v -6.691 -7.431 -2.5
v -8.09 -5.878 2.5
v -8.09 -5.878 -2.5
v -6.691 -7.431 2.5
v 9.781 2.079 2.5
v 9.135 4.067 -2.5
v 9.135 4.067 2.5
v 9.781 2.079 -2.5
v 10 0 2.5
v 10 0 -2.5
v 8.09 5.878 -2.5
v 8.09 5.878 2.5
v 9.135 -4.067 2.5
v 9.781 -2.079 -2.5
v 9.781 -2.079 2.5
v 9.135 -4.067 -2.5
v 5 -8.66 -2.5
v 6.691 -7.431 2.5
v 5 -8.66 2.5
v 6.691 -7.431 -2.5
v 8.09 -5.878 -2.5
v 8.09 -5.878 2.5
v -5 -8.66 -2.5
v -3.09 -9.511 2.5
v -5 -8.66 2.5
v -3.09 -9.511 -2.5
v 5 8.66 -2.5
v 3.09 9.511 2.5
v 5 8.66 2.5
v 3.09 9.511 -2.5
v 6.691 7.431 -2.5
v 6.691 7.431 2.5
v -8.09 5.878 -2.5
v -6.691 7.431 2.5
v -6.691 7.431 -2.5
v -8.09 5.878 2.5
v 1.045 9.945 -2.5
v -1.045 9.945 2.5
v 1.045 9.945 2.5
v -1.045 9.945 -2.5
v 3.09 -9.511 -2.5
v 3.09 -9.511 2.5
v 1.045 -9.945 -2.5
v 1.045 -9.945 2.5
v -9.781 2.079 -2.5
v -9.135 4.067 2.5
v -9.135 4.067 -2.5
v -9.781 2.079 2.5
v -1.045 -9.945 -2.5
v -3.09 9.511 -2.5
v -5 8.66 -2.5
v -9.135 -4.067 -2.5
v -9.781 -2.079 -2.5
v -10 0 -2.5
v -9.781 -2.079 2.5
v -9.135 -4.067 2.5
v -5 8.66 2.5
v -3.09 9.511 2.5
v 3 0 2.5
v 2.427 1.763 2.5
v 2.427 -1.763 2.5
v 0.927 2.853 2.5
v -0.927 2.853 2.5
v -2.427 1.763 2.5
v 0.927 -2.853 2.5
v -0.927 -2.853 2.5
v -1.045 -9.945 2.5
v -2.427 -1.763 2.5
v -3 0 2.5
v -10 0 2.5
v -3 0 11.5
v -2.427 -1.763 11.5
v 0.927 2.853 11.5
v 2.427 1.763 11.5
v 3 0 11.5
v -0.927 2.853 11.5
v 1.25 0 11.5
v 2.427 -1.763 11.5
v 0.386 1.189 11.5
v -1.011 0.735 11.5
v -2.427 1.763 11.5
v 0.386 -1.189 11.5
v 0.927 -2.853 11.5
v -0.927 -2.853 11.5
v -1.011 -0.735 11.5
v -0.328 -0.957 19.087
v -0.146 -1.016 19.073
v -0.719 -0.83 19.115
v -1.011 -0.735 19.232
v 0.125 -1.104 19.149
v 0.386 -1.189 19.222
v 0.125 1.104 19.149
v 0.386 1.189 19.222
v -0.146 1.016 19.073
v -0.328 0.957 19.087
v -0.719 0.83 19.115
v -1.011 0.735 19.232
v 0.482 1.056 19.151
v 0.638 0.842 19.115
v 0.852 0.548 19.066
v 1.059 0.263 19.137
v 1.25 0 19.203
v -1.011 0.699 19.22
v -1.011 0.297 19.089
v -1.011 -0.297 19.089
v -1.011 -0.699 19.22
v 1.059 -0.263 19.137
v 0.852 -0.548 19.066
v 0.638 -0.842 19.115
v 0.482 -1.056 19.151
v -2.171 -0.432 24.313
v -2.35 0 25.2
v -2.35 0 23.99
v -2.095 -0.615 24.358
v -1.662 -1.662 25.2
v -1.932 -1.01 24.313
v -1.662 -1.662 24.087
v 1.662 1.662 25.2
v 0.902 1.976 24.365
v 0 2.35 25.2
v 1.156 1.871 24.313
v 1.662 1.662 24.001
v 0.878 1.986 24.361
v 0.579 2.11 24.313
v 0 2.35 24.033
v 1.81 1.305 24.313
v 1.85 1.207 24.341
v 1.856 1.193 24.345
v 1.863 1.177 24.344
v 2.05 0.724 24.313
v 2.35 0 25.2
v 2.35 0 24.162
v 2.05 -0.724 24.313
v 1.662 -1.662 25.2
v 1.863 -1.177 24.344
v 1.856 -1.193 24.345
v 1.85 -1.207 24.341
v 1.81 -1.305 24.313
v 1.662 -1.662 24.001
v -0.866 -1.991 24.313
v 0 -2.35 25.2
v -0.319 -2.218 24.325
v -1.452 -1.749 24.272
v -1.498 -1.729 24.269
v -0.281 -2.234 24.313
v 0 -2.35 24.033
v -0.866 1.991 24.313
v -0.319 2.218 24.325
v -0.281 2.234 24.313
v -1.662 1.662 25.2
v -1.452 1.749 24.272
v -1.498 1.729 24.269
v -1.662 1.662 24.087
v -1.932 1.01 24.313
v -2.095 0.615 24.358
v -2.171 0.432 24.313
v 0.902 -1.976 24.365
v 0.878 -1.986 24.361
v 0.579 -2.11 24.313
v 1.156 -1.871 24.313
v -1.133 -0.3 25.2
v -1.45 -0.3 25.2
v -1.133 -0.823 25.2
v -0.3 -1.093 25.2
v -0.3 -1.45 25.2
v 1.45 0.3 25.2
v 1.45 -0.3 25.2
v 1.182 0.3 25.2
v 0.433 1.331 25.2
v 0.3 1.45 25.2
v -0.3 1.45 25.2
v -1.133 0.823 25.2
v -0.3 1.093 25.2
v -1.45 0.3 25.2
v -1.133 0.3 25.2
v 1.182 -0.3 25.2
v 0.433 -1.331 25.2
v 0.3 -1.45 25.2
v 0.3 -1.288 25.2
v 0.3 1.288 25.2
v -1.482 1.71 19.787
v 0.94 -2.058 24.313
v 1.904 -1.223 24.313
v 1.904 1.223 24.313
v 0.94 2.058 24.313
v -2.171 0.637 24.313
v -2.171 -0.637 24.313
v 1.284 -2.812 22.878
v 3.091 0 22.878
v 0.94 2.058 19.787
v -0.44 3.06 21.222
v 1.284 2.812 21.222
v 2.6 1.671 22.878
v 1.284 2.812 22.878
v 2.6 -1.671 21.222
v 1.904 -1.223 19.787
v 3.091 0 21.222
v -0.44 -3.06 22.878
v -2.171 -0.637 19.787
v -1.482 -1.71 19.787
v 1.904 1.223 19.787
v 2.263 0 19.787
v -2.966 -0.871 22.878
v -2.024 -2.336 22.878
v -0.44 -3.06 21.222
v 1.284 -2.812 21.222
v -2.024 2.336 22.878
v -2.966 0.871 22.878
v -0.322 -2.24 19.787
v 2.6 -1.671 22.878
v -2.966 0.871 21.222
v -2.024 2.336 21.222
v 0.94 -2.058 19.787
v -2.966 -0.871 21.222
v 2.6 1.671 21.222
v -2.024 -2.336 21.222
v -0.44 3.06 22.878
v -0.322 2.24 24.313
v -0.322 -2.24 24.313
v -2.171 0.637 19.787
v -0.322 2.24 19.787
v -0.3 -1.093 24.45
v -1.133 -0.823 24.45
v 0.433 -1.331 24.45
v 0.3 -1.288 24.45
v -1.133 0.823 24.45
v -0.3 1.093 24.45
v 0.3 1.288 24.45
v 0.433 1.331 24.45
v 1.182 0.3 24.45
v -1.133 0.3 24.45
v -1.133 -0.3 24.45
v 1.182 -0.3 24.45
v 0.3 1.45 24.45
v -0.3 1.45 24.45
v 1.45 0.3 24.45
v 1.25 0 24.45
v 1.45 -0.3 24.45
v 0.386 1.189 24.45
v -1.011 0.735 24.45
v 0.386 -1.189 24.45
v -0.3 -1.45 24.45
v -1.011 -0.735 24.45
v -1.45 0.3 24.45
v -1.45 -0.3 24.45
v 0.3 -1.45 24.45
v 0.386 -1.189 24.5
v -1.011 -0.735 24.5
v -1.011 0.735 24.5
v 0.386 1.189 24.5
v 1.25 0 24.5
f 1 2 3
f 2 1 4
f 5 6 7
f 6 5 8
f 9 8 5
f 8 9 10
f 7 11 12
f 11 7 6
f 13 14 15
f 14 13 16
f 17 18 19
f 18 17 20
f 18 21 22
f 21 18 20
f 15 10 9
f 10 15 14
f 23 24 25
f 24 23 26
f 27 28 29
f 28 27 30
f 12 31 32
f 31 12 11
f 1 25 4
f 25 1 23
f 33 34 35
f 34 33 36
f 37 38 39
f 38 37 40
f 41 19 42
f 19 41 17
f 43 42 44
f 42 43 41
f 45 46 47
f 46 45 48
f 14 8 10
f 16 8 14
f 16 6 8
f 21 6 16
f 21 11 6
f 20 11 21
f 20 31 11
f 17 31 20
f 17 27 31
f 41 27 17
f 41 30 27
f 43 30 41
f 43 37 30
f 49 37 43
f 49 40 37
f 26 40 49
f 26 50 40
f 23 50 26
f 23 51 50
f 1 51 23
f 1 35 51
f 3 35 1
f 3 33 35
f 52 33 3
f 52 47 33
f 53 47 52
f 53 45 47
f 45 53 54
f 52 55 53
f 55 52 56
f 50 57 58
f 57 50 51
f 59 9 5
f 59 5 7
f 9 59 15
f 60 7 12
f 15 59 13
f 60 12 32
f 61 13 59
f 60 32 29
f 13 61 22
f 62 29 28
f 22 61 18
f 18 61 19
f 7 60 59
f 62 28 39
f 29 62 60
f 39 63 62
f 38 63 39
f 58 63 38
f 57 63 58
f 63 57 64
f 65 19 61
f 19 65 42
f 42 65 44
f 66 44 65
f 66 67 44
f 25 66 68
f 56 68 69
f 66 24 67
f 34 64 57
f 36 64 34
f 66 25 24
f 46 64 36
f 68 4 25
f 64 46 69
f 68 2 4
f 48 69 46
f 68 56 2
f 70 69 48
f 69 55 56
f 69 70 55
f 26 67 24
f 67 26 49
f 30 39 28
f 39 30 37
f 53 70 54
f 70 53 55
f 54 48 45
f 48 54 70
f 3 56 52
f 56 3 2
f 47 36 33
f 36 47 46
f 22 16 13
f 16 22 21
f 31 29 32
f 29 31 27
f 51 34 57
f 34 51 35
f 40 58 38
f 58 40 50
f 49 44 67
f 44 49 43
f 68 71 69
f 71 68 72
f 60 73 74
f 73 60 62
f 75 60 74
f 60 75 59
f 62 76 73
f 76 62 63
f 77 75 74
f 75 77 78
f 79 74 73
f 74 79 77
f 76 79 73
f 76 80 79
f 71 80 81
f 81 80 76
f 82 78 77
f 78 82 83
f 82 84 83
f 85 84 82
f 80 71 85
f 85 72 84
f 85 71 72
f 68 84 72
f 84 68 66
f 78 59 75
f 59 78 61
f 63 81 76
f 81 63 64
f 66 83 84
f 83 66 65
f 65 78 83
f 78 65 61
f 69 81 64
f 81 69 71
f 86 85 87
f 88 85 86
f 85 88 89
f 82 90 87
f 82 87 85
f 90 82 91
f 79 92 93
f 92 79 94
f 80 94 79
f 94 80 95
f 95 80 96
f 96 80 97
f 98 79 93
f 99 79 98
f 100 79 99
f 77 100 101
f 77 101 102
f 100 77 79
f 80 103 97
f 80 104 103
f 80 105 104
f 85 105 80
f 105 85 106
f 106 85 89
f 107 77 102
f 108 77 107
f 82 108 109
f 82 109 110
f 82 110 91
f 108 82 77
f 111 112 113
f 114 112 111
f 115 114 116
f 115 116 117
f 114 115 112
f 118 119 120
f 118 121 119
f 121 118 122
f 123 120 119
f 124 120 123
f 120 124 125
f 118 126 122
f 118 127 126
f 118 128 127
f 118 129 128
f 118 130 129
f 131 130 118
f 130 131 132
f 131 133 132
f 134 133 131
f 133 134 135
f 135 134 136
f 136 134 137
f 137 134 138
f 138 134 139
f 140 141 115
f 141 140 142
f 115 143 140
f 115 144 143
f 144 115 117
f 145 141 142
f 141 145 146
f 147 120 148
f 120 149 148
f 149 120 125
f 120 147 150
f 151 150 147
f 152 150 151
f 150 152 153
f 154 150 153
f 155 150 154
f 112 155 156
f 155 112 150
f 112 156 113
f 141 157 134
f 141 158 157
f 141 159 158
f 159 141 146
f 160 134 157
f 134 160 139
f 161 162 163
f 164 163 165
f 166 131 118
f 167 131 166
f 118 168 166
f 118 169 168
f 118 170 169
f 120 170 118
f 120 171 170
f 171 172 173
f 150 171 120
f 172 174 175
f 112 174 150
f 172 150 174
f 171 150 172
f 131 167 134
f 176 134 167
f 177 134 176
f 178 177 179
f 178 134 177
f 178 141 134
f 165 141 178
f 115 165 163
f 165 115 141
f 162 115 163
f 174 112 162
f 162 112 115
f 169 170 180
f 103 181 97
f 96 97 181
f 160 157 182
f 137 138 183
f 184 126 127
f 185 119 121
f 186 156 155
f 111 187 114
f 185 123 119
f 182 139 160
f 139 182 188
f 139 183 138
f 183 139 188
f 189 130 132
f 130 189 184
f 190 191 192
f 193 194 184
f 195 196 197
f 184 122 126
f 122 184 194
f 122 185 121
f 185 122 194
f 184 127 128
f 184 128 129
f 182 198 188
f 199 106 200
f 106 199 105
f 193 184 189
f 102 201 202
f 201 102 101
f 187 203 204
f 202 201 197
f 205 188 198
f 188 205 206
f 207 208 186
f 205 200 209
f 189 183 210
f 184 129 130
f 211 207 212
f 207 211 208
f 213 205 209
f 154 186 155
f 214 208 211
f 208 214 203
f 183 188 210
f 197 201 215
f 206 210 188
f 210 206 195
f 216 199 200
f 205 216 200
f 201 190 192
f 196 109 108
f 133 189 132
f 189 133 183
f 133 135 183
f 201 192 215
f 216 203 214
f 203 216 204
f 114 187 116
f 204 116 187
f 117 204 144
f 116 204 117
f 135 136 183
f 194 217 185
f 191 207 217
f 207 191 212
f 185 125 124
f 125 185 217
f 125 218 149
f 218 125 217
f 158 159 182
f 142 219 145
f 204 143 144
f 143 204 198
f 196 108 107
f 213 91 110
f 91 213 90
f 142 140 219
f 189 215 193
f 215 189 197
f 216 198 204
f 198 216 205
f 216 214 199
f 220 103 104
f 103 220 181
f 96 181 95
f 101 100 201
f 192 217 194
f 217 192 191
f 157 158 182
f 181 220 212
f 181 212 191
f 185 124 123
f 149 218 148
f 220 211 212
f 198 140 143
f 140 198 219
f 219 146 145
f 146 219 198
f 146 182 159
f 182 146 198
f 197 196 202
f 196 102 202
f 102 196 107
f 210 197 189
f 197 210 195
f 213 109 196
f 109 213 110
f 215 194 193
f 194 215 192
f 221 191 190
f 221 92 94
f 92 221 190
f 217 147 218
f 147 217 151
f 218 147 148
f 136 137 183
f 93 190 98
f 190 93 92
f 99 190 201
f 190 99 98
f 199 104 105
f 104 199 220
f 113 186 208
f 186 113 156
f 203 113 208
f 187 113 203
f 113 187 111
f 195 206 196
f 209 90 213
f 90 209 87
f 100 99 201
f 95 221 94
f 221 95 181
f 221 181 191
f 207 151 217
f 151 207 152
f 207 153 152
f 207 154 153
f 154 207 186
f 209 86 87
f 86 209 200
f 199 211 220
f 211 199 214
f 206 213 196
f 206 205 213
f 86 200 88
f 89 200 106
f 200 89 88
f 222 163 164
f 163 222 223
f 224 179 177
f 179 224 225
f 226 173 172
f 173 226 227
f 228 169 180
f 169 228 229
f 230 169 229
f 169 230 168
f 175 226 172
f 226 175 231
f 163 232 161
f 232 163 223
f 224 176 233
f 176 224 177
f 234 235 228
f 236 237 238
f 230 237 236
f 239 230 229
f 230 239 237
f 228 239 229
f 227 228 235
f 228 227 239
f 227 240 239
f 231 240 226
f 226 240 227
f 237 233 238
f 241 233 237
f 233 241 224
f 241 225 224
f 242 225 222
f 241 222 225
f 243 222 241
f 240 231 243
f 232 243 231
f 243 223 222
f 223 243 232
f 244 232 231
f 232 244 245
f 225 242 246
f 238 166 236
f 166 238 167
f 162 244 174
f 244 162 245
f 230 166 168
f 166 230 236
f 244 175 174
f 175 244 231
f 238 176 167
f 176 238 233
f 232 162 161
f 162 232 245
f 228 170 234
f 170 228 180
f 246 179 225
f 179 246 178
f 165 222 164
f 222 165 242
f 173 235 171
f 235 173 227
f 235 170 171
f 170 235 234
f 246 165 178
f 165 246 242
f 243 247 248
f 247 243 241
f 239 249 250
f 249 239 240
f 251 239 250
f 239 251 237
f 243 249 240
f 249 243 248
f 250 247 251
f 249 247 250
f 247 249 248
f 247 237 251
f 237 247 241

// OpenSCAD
// Parameters
shaft_diameter_mm = 2.5; //[1.25:5:0.05]
shaft_radius_mm   = shaft_diameter_mm/2; //[0.625:2.5:0.05]
length_under_head_mm = 10; //[5:20:0.1]

head_diameter_mm = 4.7; //[2.35:9.4:0.05]
head_radius_mm   = head_diameter_mm/2; //[1.175:4.7:0.05]
head_height_mm   = 1.7; //[0.85:3.4:0.05]

eps_mm = 0.05; //[0.01:0.2:0.01]
overlap_mm = 1.0; // 1-2mm overlap to guarantee watertight connections

head_dome_radius_mm = 3.2; //[1.6:6.4:0.1]
recess_radius_mm = 1.4; //[0.7:2.8:0.05]
recess_depth_mm  = 0.7; //[0.3:1.4:0.05]
recess_slot_width_mm = 0.6; //[0.3:1.2:0.05]

// "Large black circular disk" (washer-like part) parameters
disk_radius_mm = 10;
disk_height_mm = 5;
disk_hub_radius_mm = 3;
disk_hub_height_mm = 10;

// Derived Z locations (all parts centered on Z axis)
disk_z = 0; // disk centered at origin
hub_z  = disk_z + (disk_height_mm/2 + disk_hub_height_mm/2 - overlap_mm);

// Shaft/bit assembly must be physically attached to the hub and to the screw.
// Make a connector shaft that runs from inside the hub up into the screw head underside.
connector_h_mm = length_under_head_mm + 2*overlap_mm;
connector_z = (hub_z + disk_hub_height_mm/2) + connector_h_mm/2 - overlap_mm;

// Place screw so its shaft overlaps into the connector by overlap_mm.
// Screw shaft top (in screw local coords) is at +overlap_mm above head underside.
// Therefore set head underside to connector top + overlap_mm.
connector_top_z = connector_z + connector_h_mm/2;
head_underside_z = connector_top_z + overlap_mm;
screw_z = head_underside_z + head_height_mm/2;

// Screw (single solid)
module screw() {
  union() {
    // Shaft: overlaps into head by overlap_mm
    translate([0, 0, -(head_height_mm/2 + length_under_head_mm/2 - overlap_mm)])
      cylinder(h=length_under_head_mm, r=shaft_radius_mm, center=true);

    // Pan head with recess
    difference() {
      union() {
        cylinder(h=head_height_mm, r=head_radius_mm, center=true);

        translate([0, 0, head_height_mm/2 - head_dome_radius_mm + eps_mm])
          sphere(r=head_dome_radius_mm, center=true);
      }

      // Recess cross
      union() {
        translate([0, 0, head_height_mm/2 - recess_depth_mm/2])
          cylinder(h=recess_depth_mm + 2*eps_mm, r=recess_radius_mm, center=true);

        translate([0, 0, head_height_mm/2 - recess_depth_mm/2])
          cube([2*recess_radius_mm + 2*eps_mm, recess_slot_width_mm, recess_depth_mm + 2*eps_mm], center=true);

        translate([0, 0, head_height_mm/2 - recess_depth_mm/2])
          cube([recess_slot_width_mm, 2*recess_radius_mm + 2*eps_mm, recess_depth_mm + 2*eps_mm], center=true);
      }
    }
  }
}

// Large disk + hub + connector shaft (single solid, physically attached)
module disk_stack() {
  union() {
    color("Black")
      translate([0, 0, disk_z])
        cylinder(h=disk_height_mm, r=disk_radius_mm, center=true);

    // Hub overlaps into disk by overlap_mm
    color("DimGray")
      translate([0, 0, hub_z])
        cylinder(h=disk_hub_height_mm, r=disk_hub_radius_mm, center=true);

    // Connector shaft overlaps into hub by overlap_mm and into screw shaft by overlap_mm
    color("DimGray")
      translate([0, 0, connector_z])
        cylinder(h=connector_h_mm, r=shaft_radius_mm, center=true);
  }
}

// Assembly: everything unioned into one connected solid
module assembly() {
  union() {
    disk_stack();

    translate([0, 0, screw_z])
      color("Silver")
        screw();
  }
}

assembly();
